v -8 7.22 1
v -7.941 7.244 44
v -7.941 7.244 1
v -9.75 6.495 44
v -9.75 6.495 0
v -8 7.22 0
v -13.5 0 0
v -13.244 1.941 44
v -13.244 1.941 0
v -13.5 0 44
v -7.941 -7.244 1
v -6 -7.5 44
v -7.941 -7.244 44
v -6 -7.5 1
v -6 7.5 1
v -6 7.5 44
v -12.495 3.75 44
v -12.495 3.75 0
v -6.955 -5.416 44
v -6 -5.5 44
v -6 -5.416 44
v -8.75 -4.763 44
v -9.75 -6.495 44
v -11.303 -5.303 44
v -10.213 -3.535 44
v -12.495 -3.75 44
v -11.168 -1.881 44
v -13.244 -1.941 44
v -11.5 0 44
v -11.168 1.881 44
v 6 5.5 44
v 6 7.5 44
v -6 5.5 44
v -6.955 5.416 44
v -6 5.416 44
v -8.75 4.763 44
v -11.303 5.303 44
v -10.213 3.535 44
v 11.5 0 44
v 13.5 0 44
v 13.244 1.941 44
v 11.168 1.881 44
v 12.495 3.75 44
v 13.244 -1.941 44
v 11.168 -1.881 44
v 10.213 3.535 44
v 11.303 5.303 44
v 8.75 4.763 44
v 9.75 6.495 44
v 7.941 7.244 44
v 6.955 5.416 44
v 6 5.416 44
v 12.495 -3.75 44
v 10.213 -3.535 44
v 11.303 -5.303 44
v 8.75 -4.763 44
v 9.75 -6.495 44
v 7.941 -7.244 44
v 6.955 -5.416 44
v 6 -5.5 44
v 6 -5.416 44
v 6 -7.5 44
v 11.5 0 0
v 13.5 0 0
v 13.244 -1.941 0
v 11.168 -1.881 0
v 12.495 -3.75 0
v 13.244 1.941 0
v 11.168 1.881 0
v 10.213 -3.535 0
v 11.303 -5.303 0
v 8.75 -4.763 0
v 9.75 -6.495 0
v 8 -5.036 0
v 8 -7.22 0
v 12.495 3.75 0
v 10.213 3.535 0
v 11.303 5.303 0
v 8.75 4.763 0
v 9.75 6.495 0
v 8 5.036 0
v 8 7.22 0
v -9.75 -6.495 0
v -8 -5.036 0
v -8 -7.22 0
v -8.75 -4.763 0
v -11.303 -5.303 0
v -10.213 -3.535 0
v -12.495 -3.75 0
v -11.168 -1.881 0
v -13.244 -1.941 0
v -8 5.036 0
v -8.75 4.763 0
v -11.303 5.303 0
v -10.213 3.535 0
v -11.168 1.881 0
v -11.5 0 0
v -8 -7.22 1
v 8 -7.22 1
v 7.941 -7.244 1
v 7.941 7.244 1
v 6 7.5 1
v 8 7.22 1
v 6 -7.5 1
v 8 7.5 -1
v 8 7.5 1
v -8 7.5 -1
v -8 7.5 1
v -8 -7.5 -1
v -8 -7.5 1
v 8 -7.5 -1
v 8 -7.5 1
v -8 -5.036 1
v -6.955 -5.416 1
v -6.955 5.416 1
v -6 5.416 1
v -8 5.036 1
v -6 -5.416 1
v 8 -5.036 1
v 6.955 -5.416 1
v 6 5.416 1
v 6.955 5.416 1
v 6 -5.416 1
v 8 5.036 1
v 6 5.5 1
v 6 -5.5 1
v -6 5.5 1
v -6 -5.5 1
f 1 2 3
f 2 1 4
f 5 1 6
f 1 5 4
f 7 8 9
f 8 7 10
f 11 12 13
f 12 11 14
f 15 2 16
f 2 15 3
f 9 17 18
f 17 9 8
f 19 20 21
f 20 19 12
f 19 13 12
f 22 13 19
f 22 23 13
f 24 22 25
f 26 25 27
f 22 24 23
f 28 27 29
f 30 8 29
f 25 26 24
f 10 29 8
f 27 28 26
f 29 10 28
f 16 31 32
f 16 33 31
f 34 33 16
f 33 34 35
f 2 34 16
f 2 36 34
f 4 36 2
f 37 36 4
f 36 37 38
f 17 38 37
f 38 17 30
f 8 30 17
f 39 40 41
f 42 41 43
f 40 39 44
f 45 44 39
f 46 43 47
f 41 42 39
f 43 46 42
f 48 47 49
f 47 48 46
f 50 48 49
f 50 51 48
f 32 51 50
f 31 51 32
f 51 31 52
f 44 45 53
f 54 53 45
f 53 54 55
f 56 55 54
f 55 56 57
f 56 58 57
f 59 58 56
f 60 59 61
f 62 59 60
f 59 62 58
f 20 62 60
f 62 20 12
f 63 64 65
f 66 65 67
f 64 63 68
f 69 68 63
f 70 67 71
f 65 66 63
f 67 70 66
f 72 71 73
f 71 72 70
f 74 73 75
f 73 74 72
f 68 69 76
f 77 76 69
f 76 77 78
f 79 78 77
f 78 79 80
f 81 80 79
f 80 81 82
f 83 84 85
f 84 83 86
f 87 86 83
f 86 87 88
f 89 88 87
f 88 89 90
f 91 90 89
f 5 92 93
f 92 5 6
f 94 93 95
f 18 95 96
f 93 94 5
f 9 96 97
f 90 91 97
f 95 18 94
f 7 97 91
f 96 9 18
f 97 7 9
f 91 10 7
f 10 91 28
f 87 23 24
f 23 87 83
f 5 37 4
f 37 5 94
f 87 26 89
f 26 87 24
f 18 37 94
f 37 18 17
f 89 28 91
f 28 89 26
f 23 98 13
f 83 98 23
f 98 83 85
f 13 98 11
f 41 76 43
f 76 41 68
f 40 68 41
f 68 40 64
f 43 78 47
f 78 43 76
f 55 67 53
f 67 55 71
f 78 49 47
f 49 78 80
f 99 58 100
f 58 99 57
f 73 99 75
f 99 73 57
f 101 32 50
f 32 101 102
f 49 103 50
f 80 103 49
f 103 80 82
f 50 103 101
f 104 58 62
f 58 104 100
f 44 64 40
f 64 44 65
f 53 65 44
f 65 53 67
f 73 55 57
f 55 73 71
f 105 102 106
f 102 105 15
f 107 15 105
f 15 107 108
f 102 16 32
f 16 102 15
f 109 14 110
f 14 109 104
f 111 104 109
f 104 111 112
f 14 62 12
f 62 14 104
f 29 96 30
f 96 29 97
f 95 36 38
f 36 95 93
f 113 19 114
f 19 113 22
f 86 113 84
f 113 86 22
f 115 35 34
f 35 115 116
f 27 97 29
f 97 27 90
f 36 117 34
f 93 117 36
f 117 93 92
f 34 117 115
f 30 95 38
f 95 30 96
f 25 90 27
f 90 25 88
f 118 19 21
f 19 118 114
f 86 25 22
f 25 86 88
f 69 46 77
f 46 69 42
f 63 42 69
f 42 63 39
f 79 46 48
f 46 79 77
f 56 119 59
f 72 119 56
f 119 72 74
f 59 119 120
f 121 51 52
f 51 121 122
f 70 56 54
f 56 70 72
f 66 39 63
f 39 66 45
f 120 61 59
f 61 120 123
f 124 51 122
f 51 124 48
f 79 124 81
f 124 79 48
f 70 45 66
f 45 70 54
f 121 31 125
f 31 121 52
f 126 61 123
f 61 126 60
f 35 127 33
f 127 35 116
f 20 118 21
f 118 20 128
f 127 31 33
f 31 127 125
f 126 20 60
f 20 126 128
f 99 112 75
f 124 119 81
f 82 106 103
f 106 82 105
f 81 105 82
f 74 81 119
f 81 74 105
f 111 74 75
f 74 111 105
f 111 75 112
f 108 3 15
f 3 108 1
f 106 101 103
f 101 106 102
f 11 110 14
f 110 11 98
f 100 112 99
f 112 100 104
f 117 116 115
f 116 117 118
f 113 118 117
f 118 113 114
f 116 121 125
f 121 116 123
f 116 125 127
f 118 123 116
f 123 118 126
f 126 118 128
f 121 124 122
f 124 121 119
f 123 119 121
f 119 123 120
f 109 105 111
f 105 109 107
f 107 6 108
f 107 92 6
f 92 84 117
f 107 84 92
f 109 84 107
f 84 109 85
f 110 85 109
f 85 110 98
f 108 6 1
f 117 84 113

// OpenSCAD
//AAA battery is 44mm long and 10.5mm diam.
//buzzer - screw holes 30mm apart, buzzer itself is 21mm diam
//distance between battery 6mm to accommodate 3mm bolt.
bl=44;
bd=11; //say battery is 11 diam
db = 1;
t=2;

module shell(){
translate([-(bd+db)/2,0,bl/2])
difference(){
union() {
    cylinder(r=bd/2+2,h=bl,center=true);
    translate([bd+db,0,0])cylinder(r=bd/2+2,h=bl,center=true);
    translate([(bd+db)/2,0,0])cube([bd+db,bd+4,bl],center=true);
}   
    translate([0,0,0]){
    cylinder(r=bd/2,h=bl+2,center=true);
    translate([bd+db,0,0])cylinder(r=bd/2,h=bl+2,center=true);
    translate([(bd+db)/2,0,0])cube([bd+db,bd,bl+2],center=true);
    }
  }
}

shell();
cube([bd+db+4,bd+4,t],center=true);
